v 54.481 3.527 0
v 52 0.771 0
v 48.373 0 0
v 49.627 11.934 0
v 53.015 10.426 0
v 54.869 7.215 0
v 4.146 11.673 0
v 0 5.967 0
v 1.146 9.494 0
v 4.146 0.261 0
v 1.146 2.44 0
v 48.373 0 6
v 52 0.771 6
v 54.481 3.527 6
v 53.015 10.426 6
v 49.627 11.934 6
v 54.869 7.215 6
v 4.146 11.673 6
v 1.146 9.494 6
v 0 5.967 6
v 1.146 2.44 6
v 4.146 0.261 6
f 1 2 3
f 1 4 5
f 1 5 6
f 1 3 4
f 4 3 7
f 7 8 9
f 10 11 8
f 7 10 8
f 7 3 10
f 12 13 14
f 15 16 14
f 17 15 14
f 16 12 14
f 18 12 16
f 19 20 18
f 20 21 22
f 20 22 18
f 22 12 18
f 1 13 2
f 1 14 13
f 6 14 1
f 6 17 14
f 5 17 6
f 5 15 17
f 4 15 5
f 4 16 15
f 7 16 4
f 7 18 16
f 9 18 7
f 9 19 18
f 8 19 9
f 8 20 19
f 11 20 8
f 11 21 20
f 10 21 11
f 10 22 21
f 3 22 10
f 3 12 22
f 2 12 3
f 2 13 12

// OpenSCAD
$fn = 32;

// ----------------------------------------------------------------------
// Key bar: parallel key, 6 mm thick
// ----------------------------------------------------------------------

// --- parameters (mm) ---
profile_height = 6;       // extrusion height
profile_points = 11;      // points of the closed outline

profile = [[0, 5.967], [1.146, 2.44], [4.146, 0.261], [48.373, 0], [52, 0.771], [54.481, 3.527], [54.869, 7.215], [53.015, 10.426], [49.627, 11.934], [4.146, 11.673], [1.146, 9.494]];  // single closed polygon, 11 points, counter clockwise

// --- the one profile operation ---
linear_extrude(height = profile_height) polygon(points = profile);
